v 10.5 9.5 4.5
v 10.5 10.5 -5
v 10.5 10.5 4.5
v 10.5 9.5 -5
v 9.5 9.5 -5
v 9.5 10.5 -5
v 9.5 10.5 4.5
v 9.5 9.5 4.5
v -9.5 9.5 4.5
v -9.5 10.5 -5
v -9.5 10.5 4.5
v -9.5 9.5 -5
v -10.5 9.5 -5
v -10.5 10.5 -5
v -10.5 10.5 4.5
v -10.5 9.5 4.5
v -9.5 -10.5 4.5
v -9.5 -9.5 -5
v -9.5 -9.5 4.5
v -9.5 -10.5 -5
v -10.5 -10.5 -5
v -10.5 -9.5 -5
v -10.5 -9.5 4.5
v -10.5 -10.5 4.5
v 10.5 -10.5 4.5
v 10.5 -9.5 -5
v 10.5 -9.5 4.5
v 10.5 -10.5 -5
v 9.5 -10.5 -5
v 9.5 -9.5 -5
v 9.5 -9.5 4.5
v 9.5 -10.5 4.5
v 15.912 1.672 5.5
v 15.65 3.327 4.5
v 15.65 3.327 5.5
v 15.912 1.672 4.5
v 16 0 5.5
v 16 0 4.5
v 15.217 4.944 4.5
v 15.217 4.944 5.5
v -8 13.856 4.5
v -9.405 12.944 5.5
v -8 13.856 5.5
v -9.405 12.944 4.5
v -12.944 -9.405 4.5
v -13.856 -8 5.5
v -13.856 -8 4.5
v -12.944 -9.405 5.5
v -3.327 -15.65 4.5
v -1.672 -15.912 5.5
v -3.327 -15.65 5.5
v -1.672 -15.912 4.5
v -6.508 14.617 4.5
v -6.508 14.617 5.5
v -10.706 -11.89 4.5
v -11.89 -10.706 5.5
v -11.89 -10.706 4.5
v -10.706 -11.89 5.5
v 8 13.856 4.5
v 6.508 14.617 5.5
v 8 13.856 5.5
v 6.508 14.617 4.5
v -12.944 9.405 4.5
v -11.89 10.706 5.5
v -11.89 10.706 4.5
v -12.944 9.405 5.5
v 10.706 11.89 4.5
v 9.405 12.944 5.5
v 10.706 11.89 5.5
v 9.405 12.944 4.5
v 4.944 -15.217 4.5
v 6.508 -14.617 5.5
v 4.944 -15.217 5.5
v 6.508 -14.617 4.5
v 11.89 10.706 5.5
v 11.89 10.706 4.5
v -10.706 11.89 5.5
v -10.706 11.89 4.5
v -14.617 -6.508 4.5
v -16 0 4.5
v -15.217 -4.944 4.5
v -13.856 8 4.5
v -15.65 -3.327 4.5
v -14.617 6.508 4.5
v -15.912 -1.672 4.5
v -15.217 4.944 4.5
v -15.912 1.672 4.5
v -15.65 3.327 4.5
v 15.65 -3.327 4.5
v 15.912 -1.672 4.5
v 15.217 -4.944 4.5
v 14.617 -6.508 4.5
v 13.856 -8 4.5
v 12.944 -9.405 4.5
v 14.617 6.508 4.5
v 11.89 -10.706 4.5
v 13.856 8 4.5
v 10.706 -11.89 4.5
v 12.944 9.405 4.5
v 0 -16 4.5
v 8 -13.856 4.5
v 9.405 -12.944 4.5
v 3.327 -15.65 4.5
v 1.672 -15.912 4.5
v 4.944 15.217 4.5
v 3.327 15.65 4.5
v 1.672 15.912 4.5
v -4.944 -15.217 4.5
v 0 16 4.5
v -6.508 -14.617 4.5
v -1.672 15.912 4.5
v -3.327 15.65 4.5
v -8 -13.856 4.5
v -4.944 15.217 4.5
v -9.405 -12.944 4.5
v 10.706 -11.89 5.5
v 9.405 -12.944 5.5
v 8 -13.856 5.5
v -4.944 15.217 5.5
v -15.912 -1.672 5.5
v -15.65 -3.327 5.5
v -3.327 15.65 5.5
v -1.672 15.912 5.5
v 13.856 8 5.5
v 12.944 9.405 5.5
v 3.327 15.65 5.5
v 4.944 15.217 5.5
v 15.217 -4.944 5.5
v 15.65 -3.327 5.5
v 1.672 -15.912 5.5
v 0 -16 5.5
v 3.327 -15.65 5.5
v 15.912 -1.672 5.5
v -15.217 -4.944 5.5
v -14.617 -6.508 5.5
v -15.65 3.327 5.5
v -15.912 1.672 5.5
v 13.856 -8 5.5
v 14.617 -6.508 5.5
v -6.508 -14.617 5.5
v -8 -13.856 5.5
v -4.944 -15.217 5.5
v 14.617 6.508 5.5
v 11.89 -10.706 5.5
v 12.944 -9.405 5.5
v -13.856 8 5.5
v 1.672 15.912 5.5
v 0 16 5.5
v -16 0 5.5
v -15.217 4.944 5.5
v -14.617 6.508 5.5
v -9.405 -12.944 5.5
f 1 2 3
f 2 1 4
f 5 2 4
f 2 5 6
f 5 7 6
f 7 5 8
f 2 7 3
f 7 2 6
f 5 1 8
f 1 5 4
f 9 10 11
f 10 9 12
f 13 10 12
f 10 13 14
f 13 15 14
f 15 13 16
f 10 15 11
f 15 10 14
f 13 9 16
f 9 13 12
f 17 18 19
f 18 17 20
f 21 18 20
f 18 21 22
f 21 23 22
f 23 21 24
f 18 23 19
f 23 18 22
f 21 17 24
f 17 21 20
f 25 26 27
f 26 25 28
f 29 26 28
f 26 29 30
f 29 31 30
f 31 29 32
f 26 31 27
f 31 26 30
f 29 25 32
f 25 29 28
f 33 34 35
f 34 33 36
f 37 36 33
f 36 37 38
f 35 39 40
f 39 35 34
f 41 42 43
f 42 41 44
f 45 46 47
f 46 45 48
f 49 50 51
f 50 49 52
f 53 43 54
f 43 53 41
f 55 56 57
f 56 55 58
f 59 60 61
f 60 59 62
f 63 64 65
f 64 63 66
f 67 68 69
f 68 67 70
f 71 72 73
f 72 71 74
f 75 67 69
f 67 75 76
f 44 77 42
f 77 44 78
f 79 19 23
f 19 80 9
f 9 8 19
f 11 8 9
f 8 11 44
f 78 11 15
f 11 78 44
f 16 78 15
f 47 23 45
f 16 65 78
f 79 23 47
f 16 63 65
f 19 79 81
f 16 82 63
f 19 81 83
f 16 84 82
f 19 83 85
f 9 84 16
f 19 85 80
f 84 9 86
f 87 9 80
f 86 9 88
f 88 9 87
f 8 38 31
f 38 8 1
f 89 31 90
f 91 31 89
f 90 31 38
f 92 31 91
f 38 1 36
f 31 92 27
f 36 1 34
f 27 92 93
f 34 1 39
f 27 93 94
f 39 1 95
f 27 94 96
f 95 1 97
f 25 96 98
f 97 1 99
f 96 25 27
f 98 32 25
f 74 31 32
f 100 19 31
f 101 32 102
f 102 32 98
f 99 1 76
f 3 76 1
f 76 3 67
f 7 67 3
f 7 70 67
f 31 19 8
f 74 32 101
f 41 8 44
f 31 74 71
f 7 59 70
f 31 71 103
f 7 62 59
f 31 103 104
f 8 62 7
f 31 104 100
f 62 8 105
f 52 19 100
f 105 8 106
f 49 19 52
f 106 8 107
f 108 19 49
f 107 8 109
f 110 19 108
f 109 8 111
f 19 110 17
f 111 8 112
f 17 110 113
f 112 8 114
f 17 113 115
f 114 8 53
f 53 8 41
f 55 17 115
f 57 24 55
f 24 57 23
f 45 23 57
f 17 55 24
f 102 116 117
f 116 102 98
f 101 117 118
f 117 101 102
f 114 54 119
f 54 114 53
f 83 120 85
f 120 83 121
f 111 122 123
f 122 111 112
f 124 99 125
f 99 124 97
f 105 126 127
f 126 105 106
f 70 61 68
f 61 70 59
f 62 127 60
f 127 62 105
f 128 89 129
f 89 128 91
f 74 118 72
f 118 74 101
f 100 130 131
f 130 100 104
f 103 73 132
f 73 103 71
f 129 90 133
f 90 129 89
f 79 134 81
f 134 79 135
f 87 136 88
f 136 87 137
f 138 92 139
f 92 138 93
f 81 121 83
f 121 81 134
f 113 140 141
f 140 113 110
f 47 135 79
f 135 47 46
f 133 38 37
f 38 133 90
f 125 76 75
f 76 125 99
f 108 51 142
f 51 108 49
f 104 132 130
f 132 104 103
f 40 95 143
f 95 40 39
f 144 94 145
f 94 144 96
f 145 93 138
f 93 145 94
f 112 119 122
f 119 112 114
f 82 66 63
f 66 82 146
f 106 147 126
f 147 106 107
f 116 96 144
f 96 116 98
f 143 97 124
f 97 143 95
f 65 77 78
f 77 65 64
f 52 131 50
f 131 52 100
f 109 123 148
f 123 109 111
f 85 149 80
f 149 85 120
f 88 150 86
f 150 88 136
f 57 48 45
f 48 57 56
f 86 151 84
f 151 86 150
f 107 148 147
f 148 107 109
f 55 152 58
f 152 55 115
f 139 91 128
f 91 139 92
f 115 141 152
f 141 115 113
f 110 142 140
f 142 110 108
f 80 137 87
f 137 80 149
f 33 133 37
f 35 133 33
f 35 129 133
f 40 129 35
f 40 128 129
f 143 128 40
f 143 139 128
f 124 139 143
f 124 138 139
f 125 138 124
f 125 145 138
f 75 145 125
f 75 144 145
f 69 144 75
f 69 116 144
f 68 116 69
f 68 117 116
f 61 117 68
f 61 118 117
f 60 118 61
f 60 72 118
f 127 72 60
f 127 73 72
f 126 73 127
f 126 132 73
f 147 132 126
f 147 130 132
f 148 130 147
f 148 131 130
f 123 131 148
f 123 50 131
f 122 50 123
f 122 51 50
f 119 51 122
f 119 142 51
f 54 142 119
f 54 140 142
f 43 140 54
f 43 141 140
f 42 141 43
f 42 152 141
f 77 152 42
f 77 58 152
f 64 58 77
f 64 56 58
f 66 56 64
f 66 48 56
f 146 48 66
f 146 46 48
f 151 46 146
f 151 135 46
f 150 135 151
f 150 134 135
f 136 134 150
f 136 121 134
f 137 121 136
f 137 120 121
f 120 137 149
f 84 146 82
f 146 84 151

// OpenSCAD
// Angelo Nicolì 2023 - Licensed GPL-2.0


Table_Leg = [1,1,10];

Leg_Distance_x = 20;
Leg_Distance_y = Leg_Distance_x;
Upper_Part_Size = Leg_Distance_x * 0.8;
Upper_Part_Height = 1;



color("#cdaa7d"){
// Legs 
translate([Leg_Distance_x*0.5,Leg_Distance_y*0.5,0])
cube([Table_Leg[0],Table_Leg[1],Table_Leg[2]],center=true);

translate([-Leg_Distance_x*0.5,Leg_Distance_y*0.5,0])
cube([Table_Leg[0],Table_Leg[1],Table_Leg[2]],center=true);

translate([-Leg_Distance_x*0.5,-Leg_Distance_y*0.5,0])
cube([Table_Leg[0],Table_Leg[1],Table_Leg[2]],center=true);

translate([Leg_Distance_x*0.5,-Leg_Distance_y*0.5,0])
cube([Table_Leg[0],Table_Leg[1],Table_Leg[2]],center=true);

Table_Upper = [Leg_Distance_x+Table_Leg[0],Leg_Distance_y + Table_Leg[1],1];
Table_Height = Table_Leg[2]*0.5;

// Circle
translate([0,0,Table_Height]){
cylinder(r = Upper_Part_Size, h = Upper_Part_Height,$fn = 60 , center=true);
}

}
